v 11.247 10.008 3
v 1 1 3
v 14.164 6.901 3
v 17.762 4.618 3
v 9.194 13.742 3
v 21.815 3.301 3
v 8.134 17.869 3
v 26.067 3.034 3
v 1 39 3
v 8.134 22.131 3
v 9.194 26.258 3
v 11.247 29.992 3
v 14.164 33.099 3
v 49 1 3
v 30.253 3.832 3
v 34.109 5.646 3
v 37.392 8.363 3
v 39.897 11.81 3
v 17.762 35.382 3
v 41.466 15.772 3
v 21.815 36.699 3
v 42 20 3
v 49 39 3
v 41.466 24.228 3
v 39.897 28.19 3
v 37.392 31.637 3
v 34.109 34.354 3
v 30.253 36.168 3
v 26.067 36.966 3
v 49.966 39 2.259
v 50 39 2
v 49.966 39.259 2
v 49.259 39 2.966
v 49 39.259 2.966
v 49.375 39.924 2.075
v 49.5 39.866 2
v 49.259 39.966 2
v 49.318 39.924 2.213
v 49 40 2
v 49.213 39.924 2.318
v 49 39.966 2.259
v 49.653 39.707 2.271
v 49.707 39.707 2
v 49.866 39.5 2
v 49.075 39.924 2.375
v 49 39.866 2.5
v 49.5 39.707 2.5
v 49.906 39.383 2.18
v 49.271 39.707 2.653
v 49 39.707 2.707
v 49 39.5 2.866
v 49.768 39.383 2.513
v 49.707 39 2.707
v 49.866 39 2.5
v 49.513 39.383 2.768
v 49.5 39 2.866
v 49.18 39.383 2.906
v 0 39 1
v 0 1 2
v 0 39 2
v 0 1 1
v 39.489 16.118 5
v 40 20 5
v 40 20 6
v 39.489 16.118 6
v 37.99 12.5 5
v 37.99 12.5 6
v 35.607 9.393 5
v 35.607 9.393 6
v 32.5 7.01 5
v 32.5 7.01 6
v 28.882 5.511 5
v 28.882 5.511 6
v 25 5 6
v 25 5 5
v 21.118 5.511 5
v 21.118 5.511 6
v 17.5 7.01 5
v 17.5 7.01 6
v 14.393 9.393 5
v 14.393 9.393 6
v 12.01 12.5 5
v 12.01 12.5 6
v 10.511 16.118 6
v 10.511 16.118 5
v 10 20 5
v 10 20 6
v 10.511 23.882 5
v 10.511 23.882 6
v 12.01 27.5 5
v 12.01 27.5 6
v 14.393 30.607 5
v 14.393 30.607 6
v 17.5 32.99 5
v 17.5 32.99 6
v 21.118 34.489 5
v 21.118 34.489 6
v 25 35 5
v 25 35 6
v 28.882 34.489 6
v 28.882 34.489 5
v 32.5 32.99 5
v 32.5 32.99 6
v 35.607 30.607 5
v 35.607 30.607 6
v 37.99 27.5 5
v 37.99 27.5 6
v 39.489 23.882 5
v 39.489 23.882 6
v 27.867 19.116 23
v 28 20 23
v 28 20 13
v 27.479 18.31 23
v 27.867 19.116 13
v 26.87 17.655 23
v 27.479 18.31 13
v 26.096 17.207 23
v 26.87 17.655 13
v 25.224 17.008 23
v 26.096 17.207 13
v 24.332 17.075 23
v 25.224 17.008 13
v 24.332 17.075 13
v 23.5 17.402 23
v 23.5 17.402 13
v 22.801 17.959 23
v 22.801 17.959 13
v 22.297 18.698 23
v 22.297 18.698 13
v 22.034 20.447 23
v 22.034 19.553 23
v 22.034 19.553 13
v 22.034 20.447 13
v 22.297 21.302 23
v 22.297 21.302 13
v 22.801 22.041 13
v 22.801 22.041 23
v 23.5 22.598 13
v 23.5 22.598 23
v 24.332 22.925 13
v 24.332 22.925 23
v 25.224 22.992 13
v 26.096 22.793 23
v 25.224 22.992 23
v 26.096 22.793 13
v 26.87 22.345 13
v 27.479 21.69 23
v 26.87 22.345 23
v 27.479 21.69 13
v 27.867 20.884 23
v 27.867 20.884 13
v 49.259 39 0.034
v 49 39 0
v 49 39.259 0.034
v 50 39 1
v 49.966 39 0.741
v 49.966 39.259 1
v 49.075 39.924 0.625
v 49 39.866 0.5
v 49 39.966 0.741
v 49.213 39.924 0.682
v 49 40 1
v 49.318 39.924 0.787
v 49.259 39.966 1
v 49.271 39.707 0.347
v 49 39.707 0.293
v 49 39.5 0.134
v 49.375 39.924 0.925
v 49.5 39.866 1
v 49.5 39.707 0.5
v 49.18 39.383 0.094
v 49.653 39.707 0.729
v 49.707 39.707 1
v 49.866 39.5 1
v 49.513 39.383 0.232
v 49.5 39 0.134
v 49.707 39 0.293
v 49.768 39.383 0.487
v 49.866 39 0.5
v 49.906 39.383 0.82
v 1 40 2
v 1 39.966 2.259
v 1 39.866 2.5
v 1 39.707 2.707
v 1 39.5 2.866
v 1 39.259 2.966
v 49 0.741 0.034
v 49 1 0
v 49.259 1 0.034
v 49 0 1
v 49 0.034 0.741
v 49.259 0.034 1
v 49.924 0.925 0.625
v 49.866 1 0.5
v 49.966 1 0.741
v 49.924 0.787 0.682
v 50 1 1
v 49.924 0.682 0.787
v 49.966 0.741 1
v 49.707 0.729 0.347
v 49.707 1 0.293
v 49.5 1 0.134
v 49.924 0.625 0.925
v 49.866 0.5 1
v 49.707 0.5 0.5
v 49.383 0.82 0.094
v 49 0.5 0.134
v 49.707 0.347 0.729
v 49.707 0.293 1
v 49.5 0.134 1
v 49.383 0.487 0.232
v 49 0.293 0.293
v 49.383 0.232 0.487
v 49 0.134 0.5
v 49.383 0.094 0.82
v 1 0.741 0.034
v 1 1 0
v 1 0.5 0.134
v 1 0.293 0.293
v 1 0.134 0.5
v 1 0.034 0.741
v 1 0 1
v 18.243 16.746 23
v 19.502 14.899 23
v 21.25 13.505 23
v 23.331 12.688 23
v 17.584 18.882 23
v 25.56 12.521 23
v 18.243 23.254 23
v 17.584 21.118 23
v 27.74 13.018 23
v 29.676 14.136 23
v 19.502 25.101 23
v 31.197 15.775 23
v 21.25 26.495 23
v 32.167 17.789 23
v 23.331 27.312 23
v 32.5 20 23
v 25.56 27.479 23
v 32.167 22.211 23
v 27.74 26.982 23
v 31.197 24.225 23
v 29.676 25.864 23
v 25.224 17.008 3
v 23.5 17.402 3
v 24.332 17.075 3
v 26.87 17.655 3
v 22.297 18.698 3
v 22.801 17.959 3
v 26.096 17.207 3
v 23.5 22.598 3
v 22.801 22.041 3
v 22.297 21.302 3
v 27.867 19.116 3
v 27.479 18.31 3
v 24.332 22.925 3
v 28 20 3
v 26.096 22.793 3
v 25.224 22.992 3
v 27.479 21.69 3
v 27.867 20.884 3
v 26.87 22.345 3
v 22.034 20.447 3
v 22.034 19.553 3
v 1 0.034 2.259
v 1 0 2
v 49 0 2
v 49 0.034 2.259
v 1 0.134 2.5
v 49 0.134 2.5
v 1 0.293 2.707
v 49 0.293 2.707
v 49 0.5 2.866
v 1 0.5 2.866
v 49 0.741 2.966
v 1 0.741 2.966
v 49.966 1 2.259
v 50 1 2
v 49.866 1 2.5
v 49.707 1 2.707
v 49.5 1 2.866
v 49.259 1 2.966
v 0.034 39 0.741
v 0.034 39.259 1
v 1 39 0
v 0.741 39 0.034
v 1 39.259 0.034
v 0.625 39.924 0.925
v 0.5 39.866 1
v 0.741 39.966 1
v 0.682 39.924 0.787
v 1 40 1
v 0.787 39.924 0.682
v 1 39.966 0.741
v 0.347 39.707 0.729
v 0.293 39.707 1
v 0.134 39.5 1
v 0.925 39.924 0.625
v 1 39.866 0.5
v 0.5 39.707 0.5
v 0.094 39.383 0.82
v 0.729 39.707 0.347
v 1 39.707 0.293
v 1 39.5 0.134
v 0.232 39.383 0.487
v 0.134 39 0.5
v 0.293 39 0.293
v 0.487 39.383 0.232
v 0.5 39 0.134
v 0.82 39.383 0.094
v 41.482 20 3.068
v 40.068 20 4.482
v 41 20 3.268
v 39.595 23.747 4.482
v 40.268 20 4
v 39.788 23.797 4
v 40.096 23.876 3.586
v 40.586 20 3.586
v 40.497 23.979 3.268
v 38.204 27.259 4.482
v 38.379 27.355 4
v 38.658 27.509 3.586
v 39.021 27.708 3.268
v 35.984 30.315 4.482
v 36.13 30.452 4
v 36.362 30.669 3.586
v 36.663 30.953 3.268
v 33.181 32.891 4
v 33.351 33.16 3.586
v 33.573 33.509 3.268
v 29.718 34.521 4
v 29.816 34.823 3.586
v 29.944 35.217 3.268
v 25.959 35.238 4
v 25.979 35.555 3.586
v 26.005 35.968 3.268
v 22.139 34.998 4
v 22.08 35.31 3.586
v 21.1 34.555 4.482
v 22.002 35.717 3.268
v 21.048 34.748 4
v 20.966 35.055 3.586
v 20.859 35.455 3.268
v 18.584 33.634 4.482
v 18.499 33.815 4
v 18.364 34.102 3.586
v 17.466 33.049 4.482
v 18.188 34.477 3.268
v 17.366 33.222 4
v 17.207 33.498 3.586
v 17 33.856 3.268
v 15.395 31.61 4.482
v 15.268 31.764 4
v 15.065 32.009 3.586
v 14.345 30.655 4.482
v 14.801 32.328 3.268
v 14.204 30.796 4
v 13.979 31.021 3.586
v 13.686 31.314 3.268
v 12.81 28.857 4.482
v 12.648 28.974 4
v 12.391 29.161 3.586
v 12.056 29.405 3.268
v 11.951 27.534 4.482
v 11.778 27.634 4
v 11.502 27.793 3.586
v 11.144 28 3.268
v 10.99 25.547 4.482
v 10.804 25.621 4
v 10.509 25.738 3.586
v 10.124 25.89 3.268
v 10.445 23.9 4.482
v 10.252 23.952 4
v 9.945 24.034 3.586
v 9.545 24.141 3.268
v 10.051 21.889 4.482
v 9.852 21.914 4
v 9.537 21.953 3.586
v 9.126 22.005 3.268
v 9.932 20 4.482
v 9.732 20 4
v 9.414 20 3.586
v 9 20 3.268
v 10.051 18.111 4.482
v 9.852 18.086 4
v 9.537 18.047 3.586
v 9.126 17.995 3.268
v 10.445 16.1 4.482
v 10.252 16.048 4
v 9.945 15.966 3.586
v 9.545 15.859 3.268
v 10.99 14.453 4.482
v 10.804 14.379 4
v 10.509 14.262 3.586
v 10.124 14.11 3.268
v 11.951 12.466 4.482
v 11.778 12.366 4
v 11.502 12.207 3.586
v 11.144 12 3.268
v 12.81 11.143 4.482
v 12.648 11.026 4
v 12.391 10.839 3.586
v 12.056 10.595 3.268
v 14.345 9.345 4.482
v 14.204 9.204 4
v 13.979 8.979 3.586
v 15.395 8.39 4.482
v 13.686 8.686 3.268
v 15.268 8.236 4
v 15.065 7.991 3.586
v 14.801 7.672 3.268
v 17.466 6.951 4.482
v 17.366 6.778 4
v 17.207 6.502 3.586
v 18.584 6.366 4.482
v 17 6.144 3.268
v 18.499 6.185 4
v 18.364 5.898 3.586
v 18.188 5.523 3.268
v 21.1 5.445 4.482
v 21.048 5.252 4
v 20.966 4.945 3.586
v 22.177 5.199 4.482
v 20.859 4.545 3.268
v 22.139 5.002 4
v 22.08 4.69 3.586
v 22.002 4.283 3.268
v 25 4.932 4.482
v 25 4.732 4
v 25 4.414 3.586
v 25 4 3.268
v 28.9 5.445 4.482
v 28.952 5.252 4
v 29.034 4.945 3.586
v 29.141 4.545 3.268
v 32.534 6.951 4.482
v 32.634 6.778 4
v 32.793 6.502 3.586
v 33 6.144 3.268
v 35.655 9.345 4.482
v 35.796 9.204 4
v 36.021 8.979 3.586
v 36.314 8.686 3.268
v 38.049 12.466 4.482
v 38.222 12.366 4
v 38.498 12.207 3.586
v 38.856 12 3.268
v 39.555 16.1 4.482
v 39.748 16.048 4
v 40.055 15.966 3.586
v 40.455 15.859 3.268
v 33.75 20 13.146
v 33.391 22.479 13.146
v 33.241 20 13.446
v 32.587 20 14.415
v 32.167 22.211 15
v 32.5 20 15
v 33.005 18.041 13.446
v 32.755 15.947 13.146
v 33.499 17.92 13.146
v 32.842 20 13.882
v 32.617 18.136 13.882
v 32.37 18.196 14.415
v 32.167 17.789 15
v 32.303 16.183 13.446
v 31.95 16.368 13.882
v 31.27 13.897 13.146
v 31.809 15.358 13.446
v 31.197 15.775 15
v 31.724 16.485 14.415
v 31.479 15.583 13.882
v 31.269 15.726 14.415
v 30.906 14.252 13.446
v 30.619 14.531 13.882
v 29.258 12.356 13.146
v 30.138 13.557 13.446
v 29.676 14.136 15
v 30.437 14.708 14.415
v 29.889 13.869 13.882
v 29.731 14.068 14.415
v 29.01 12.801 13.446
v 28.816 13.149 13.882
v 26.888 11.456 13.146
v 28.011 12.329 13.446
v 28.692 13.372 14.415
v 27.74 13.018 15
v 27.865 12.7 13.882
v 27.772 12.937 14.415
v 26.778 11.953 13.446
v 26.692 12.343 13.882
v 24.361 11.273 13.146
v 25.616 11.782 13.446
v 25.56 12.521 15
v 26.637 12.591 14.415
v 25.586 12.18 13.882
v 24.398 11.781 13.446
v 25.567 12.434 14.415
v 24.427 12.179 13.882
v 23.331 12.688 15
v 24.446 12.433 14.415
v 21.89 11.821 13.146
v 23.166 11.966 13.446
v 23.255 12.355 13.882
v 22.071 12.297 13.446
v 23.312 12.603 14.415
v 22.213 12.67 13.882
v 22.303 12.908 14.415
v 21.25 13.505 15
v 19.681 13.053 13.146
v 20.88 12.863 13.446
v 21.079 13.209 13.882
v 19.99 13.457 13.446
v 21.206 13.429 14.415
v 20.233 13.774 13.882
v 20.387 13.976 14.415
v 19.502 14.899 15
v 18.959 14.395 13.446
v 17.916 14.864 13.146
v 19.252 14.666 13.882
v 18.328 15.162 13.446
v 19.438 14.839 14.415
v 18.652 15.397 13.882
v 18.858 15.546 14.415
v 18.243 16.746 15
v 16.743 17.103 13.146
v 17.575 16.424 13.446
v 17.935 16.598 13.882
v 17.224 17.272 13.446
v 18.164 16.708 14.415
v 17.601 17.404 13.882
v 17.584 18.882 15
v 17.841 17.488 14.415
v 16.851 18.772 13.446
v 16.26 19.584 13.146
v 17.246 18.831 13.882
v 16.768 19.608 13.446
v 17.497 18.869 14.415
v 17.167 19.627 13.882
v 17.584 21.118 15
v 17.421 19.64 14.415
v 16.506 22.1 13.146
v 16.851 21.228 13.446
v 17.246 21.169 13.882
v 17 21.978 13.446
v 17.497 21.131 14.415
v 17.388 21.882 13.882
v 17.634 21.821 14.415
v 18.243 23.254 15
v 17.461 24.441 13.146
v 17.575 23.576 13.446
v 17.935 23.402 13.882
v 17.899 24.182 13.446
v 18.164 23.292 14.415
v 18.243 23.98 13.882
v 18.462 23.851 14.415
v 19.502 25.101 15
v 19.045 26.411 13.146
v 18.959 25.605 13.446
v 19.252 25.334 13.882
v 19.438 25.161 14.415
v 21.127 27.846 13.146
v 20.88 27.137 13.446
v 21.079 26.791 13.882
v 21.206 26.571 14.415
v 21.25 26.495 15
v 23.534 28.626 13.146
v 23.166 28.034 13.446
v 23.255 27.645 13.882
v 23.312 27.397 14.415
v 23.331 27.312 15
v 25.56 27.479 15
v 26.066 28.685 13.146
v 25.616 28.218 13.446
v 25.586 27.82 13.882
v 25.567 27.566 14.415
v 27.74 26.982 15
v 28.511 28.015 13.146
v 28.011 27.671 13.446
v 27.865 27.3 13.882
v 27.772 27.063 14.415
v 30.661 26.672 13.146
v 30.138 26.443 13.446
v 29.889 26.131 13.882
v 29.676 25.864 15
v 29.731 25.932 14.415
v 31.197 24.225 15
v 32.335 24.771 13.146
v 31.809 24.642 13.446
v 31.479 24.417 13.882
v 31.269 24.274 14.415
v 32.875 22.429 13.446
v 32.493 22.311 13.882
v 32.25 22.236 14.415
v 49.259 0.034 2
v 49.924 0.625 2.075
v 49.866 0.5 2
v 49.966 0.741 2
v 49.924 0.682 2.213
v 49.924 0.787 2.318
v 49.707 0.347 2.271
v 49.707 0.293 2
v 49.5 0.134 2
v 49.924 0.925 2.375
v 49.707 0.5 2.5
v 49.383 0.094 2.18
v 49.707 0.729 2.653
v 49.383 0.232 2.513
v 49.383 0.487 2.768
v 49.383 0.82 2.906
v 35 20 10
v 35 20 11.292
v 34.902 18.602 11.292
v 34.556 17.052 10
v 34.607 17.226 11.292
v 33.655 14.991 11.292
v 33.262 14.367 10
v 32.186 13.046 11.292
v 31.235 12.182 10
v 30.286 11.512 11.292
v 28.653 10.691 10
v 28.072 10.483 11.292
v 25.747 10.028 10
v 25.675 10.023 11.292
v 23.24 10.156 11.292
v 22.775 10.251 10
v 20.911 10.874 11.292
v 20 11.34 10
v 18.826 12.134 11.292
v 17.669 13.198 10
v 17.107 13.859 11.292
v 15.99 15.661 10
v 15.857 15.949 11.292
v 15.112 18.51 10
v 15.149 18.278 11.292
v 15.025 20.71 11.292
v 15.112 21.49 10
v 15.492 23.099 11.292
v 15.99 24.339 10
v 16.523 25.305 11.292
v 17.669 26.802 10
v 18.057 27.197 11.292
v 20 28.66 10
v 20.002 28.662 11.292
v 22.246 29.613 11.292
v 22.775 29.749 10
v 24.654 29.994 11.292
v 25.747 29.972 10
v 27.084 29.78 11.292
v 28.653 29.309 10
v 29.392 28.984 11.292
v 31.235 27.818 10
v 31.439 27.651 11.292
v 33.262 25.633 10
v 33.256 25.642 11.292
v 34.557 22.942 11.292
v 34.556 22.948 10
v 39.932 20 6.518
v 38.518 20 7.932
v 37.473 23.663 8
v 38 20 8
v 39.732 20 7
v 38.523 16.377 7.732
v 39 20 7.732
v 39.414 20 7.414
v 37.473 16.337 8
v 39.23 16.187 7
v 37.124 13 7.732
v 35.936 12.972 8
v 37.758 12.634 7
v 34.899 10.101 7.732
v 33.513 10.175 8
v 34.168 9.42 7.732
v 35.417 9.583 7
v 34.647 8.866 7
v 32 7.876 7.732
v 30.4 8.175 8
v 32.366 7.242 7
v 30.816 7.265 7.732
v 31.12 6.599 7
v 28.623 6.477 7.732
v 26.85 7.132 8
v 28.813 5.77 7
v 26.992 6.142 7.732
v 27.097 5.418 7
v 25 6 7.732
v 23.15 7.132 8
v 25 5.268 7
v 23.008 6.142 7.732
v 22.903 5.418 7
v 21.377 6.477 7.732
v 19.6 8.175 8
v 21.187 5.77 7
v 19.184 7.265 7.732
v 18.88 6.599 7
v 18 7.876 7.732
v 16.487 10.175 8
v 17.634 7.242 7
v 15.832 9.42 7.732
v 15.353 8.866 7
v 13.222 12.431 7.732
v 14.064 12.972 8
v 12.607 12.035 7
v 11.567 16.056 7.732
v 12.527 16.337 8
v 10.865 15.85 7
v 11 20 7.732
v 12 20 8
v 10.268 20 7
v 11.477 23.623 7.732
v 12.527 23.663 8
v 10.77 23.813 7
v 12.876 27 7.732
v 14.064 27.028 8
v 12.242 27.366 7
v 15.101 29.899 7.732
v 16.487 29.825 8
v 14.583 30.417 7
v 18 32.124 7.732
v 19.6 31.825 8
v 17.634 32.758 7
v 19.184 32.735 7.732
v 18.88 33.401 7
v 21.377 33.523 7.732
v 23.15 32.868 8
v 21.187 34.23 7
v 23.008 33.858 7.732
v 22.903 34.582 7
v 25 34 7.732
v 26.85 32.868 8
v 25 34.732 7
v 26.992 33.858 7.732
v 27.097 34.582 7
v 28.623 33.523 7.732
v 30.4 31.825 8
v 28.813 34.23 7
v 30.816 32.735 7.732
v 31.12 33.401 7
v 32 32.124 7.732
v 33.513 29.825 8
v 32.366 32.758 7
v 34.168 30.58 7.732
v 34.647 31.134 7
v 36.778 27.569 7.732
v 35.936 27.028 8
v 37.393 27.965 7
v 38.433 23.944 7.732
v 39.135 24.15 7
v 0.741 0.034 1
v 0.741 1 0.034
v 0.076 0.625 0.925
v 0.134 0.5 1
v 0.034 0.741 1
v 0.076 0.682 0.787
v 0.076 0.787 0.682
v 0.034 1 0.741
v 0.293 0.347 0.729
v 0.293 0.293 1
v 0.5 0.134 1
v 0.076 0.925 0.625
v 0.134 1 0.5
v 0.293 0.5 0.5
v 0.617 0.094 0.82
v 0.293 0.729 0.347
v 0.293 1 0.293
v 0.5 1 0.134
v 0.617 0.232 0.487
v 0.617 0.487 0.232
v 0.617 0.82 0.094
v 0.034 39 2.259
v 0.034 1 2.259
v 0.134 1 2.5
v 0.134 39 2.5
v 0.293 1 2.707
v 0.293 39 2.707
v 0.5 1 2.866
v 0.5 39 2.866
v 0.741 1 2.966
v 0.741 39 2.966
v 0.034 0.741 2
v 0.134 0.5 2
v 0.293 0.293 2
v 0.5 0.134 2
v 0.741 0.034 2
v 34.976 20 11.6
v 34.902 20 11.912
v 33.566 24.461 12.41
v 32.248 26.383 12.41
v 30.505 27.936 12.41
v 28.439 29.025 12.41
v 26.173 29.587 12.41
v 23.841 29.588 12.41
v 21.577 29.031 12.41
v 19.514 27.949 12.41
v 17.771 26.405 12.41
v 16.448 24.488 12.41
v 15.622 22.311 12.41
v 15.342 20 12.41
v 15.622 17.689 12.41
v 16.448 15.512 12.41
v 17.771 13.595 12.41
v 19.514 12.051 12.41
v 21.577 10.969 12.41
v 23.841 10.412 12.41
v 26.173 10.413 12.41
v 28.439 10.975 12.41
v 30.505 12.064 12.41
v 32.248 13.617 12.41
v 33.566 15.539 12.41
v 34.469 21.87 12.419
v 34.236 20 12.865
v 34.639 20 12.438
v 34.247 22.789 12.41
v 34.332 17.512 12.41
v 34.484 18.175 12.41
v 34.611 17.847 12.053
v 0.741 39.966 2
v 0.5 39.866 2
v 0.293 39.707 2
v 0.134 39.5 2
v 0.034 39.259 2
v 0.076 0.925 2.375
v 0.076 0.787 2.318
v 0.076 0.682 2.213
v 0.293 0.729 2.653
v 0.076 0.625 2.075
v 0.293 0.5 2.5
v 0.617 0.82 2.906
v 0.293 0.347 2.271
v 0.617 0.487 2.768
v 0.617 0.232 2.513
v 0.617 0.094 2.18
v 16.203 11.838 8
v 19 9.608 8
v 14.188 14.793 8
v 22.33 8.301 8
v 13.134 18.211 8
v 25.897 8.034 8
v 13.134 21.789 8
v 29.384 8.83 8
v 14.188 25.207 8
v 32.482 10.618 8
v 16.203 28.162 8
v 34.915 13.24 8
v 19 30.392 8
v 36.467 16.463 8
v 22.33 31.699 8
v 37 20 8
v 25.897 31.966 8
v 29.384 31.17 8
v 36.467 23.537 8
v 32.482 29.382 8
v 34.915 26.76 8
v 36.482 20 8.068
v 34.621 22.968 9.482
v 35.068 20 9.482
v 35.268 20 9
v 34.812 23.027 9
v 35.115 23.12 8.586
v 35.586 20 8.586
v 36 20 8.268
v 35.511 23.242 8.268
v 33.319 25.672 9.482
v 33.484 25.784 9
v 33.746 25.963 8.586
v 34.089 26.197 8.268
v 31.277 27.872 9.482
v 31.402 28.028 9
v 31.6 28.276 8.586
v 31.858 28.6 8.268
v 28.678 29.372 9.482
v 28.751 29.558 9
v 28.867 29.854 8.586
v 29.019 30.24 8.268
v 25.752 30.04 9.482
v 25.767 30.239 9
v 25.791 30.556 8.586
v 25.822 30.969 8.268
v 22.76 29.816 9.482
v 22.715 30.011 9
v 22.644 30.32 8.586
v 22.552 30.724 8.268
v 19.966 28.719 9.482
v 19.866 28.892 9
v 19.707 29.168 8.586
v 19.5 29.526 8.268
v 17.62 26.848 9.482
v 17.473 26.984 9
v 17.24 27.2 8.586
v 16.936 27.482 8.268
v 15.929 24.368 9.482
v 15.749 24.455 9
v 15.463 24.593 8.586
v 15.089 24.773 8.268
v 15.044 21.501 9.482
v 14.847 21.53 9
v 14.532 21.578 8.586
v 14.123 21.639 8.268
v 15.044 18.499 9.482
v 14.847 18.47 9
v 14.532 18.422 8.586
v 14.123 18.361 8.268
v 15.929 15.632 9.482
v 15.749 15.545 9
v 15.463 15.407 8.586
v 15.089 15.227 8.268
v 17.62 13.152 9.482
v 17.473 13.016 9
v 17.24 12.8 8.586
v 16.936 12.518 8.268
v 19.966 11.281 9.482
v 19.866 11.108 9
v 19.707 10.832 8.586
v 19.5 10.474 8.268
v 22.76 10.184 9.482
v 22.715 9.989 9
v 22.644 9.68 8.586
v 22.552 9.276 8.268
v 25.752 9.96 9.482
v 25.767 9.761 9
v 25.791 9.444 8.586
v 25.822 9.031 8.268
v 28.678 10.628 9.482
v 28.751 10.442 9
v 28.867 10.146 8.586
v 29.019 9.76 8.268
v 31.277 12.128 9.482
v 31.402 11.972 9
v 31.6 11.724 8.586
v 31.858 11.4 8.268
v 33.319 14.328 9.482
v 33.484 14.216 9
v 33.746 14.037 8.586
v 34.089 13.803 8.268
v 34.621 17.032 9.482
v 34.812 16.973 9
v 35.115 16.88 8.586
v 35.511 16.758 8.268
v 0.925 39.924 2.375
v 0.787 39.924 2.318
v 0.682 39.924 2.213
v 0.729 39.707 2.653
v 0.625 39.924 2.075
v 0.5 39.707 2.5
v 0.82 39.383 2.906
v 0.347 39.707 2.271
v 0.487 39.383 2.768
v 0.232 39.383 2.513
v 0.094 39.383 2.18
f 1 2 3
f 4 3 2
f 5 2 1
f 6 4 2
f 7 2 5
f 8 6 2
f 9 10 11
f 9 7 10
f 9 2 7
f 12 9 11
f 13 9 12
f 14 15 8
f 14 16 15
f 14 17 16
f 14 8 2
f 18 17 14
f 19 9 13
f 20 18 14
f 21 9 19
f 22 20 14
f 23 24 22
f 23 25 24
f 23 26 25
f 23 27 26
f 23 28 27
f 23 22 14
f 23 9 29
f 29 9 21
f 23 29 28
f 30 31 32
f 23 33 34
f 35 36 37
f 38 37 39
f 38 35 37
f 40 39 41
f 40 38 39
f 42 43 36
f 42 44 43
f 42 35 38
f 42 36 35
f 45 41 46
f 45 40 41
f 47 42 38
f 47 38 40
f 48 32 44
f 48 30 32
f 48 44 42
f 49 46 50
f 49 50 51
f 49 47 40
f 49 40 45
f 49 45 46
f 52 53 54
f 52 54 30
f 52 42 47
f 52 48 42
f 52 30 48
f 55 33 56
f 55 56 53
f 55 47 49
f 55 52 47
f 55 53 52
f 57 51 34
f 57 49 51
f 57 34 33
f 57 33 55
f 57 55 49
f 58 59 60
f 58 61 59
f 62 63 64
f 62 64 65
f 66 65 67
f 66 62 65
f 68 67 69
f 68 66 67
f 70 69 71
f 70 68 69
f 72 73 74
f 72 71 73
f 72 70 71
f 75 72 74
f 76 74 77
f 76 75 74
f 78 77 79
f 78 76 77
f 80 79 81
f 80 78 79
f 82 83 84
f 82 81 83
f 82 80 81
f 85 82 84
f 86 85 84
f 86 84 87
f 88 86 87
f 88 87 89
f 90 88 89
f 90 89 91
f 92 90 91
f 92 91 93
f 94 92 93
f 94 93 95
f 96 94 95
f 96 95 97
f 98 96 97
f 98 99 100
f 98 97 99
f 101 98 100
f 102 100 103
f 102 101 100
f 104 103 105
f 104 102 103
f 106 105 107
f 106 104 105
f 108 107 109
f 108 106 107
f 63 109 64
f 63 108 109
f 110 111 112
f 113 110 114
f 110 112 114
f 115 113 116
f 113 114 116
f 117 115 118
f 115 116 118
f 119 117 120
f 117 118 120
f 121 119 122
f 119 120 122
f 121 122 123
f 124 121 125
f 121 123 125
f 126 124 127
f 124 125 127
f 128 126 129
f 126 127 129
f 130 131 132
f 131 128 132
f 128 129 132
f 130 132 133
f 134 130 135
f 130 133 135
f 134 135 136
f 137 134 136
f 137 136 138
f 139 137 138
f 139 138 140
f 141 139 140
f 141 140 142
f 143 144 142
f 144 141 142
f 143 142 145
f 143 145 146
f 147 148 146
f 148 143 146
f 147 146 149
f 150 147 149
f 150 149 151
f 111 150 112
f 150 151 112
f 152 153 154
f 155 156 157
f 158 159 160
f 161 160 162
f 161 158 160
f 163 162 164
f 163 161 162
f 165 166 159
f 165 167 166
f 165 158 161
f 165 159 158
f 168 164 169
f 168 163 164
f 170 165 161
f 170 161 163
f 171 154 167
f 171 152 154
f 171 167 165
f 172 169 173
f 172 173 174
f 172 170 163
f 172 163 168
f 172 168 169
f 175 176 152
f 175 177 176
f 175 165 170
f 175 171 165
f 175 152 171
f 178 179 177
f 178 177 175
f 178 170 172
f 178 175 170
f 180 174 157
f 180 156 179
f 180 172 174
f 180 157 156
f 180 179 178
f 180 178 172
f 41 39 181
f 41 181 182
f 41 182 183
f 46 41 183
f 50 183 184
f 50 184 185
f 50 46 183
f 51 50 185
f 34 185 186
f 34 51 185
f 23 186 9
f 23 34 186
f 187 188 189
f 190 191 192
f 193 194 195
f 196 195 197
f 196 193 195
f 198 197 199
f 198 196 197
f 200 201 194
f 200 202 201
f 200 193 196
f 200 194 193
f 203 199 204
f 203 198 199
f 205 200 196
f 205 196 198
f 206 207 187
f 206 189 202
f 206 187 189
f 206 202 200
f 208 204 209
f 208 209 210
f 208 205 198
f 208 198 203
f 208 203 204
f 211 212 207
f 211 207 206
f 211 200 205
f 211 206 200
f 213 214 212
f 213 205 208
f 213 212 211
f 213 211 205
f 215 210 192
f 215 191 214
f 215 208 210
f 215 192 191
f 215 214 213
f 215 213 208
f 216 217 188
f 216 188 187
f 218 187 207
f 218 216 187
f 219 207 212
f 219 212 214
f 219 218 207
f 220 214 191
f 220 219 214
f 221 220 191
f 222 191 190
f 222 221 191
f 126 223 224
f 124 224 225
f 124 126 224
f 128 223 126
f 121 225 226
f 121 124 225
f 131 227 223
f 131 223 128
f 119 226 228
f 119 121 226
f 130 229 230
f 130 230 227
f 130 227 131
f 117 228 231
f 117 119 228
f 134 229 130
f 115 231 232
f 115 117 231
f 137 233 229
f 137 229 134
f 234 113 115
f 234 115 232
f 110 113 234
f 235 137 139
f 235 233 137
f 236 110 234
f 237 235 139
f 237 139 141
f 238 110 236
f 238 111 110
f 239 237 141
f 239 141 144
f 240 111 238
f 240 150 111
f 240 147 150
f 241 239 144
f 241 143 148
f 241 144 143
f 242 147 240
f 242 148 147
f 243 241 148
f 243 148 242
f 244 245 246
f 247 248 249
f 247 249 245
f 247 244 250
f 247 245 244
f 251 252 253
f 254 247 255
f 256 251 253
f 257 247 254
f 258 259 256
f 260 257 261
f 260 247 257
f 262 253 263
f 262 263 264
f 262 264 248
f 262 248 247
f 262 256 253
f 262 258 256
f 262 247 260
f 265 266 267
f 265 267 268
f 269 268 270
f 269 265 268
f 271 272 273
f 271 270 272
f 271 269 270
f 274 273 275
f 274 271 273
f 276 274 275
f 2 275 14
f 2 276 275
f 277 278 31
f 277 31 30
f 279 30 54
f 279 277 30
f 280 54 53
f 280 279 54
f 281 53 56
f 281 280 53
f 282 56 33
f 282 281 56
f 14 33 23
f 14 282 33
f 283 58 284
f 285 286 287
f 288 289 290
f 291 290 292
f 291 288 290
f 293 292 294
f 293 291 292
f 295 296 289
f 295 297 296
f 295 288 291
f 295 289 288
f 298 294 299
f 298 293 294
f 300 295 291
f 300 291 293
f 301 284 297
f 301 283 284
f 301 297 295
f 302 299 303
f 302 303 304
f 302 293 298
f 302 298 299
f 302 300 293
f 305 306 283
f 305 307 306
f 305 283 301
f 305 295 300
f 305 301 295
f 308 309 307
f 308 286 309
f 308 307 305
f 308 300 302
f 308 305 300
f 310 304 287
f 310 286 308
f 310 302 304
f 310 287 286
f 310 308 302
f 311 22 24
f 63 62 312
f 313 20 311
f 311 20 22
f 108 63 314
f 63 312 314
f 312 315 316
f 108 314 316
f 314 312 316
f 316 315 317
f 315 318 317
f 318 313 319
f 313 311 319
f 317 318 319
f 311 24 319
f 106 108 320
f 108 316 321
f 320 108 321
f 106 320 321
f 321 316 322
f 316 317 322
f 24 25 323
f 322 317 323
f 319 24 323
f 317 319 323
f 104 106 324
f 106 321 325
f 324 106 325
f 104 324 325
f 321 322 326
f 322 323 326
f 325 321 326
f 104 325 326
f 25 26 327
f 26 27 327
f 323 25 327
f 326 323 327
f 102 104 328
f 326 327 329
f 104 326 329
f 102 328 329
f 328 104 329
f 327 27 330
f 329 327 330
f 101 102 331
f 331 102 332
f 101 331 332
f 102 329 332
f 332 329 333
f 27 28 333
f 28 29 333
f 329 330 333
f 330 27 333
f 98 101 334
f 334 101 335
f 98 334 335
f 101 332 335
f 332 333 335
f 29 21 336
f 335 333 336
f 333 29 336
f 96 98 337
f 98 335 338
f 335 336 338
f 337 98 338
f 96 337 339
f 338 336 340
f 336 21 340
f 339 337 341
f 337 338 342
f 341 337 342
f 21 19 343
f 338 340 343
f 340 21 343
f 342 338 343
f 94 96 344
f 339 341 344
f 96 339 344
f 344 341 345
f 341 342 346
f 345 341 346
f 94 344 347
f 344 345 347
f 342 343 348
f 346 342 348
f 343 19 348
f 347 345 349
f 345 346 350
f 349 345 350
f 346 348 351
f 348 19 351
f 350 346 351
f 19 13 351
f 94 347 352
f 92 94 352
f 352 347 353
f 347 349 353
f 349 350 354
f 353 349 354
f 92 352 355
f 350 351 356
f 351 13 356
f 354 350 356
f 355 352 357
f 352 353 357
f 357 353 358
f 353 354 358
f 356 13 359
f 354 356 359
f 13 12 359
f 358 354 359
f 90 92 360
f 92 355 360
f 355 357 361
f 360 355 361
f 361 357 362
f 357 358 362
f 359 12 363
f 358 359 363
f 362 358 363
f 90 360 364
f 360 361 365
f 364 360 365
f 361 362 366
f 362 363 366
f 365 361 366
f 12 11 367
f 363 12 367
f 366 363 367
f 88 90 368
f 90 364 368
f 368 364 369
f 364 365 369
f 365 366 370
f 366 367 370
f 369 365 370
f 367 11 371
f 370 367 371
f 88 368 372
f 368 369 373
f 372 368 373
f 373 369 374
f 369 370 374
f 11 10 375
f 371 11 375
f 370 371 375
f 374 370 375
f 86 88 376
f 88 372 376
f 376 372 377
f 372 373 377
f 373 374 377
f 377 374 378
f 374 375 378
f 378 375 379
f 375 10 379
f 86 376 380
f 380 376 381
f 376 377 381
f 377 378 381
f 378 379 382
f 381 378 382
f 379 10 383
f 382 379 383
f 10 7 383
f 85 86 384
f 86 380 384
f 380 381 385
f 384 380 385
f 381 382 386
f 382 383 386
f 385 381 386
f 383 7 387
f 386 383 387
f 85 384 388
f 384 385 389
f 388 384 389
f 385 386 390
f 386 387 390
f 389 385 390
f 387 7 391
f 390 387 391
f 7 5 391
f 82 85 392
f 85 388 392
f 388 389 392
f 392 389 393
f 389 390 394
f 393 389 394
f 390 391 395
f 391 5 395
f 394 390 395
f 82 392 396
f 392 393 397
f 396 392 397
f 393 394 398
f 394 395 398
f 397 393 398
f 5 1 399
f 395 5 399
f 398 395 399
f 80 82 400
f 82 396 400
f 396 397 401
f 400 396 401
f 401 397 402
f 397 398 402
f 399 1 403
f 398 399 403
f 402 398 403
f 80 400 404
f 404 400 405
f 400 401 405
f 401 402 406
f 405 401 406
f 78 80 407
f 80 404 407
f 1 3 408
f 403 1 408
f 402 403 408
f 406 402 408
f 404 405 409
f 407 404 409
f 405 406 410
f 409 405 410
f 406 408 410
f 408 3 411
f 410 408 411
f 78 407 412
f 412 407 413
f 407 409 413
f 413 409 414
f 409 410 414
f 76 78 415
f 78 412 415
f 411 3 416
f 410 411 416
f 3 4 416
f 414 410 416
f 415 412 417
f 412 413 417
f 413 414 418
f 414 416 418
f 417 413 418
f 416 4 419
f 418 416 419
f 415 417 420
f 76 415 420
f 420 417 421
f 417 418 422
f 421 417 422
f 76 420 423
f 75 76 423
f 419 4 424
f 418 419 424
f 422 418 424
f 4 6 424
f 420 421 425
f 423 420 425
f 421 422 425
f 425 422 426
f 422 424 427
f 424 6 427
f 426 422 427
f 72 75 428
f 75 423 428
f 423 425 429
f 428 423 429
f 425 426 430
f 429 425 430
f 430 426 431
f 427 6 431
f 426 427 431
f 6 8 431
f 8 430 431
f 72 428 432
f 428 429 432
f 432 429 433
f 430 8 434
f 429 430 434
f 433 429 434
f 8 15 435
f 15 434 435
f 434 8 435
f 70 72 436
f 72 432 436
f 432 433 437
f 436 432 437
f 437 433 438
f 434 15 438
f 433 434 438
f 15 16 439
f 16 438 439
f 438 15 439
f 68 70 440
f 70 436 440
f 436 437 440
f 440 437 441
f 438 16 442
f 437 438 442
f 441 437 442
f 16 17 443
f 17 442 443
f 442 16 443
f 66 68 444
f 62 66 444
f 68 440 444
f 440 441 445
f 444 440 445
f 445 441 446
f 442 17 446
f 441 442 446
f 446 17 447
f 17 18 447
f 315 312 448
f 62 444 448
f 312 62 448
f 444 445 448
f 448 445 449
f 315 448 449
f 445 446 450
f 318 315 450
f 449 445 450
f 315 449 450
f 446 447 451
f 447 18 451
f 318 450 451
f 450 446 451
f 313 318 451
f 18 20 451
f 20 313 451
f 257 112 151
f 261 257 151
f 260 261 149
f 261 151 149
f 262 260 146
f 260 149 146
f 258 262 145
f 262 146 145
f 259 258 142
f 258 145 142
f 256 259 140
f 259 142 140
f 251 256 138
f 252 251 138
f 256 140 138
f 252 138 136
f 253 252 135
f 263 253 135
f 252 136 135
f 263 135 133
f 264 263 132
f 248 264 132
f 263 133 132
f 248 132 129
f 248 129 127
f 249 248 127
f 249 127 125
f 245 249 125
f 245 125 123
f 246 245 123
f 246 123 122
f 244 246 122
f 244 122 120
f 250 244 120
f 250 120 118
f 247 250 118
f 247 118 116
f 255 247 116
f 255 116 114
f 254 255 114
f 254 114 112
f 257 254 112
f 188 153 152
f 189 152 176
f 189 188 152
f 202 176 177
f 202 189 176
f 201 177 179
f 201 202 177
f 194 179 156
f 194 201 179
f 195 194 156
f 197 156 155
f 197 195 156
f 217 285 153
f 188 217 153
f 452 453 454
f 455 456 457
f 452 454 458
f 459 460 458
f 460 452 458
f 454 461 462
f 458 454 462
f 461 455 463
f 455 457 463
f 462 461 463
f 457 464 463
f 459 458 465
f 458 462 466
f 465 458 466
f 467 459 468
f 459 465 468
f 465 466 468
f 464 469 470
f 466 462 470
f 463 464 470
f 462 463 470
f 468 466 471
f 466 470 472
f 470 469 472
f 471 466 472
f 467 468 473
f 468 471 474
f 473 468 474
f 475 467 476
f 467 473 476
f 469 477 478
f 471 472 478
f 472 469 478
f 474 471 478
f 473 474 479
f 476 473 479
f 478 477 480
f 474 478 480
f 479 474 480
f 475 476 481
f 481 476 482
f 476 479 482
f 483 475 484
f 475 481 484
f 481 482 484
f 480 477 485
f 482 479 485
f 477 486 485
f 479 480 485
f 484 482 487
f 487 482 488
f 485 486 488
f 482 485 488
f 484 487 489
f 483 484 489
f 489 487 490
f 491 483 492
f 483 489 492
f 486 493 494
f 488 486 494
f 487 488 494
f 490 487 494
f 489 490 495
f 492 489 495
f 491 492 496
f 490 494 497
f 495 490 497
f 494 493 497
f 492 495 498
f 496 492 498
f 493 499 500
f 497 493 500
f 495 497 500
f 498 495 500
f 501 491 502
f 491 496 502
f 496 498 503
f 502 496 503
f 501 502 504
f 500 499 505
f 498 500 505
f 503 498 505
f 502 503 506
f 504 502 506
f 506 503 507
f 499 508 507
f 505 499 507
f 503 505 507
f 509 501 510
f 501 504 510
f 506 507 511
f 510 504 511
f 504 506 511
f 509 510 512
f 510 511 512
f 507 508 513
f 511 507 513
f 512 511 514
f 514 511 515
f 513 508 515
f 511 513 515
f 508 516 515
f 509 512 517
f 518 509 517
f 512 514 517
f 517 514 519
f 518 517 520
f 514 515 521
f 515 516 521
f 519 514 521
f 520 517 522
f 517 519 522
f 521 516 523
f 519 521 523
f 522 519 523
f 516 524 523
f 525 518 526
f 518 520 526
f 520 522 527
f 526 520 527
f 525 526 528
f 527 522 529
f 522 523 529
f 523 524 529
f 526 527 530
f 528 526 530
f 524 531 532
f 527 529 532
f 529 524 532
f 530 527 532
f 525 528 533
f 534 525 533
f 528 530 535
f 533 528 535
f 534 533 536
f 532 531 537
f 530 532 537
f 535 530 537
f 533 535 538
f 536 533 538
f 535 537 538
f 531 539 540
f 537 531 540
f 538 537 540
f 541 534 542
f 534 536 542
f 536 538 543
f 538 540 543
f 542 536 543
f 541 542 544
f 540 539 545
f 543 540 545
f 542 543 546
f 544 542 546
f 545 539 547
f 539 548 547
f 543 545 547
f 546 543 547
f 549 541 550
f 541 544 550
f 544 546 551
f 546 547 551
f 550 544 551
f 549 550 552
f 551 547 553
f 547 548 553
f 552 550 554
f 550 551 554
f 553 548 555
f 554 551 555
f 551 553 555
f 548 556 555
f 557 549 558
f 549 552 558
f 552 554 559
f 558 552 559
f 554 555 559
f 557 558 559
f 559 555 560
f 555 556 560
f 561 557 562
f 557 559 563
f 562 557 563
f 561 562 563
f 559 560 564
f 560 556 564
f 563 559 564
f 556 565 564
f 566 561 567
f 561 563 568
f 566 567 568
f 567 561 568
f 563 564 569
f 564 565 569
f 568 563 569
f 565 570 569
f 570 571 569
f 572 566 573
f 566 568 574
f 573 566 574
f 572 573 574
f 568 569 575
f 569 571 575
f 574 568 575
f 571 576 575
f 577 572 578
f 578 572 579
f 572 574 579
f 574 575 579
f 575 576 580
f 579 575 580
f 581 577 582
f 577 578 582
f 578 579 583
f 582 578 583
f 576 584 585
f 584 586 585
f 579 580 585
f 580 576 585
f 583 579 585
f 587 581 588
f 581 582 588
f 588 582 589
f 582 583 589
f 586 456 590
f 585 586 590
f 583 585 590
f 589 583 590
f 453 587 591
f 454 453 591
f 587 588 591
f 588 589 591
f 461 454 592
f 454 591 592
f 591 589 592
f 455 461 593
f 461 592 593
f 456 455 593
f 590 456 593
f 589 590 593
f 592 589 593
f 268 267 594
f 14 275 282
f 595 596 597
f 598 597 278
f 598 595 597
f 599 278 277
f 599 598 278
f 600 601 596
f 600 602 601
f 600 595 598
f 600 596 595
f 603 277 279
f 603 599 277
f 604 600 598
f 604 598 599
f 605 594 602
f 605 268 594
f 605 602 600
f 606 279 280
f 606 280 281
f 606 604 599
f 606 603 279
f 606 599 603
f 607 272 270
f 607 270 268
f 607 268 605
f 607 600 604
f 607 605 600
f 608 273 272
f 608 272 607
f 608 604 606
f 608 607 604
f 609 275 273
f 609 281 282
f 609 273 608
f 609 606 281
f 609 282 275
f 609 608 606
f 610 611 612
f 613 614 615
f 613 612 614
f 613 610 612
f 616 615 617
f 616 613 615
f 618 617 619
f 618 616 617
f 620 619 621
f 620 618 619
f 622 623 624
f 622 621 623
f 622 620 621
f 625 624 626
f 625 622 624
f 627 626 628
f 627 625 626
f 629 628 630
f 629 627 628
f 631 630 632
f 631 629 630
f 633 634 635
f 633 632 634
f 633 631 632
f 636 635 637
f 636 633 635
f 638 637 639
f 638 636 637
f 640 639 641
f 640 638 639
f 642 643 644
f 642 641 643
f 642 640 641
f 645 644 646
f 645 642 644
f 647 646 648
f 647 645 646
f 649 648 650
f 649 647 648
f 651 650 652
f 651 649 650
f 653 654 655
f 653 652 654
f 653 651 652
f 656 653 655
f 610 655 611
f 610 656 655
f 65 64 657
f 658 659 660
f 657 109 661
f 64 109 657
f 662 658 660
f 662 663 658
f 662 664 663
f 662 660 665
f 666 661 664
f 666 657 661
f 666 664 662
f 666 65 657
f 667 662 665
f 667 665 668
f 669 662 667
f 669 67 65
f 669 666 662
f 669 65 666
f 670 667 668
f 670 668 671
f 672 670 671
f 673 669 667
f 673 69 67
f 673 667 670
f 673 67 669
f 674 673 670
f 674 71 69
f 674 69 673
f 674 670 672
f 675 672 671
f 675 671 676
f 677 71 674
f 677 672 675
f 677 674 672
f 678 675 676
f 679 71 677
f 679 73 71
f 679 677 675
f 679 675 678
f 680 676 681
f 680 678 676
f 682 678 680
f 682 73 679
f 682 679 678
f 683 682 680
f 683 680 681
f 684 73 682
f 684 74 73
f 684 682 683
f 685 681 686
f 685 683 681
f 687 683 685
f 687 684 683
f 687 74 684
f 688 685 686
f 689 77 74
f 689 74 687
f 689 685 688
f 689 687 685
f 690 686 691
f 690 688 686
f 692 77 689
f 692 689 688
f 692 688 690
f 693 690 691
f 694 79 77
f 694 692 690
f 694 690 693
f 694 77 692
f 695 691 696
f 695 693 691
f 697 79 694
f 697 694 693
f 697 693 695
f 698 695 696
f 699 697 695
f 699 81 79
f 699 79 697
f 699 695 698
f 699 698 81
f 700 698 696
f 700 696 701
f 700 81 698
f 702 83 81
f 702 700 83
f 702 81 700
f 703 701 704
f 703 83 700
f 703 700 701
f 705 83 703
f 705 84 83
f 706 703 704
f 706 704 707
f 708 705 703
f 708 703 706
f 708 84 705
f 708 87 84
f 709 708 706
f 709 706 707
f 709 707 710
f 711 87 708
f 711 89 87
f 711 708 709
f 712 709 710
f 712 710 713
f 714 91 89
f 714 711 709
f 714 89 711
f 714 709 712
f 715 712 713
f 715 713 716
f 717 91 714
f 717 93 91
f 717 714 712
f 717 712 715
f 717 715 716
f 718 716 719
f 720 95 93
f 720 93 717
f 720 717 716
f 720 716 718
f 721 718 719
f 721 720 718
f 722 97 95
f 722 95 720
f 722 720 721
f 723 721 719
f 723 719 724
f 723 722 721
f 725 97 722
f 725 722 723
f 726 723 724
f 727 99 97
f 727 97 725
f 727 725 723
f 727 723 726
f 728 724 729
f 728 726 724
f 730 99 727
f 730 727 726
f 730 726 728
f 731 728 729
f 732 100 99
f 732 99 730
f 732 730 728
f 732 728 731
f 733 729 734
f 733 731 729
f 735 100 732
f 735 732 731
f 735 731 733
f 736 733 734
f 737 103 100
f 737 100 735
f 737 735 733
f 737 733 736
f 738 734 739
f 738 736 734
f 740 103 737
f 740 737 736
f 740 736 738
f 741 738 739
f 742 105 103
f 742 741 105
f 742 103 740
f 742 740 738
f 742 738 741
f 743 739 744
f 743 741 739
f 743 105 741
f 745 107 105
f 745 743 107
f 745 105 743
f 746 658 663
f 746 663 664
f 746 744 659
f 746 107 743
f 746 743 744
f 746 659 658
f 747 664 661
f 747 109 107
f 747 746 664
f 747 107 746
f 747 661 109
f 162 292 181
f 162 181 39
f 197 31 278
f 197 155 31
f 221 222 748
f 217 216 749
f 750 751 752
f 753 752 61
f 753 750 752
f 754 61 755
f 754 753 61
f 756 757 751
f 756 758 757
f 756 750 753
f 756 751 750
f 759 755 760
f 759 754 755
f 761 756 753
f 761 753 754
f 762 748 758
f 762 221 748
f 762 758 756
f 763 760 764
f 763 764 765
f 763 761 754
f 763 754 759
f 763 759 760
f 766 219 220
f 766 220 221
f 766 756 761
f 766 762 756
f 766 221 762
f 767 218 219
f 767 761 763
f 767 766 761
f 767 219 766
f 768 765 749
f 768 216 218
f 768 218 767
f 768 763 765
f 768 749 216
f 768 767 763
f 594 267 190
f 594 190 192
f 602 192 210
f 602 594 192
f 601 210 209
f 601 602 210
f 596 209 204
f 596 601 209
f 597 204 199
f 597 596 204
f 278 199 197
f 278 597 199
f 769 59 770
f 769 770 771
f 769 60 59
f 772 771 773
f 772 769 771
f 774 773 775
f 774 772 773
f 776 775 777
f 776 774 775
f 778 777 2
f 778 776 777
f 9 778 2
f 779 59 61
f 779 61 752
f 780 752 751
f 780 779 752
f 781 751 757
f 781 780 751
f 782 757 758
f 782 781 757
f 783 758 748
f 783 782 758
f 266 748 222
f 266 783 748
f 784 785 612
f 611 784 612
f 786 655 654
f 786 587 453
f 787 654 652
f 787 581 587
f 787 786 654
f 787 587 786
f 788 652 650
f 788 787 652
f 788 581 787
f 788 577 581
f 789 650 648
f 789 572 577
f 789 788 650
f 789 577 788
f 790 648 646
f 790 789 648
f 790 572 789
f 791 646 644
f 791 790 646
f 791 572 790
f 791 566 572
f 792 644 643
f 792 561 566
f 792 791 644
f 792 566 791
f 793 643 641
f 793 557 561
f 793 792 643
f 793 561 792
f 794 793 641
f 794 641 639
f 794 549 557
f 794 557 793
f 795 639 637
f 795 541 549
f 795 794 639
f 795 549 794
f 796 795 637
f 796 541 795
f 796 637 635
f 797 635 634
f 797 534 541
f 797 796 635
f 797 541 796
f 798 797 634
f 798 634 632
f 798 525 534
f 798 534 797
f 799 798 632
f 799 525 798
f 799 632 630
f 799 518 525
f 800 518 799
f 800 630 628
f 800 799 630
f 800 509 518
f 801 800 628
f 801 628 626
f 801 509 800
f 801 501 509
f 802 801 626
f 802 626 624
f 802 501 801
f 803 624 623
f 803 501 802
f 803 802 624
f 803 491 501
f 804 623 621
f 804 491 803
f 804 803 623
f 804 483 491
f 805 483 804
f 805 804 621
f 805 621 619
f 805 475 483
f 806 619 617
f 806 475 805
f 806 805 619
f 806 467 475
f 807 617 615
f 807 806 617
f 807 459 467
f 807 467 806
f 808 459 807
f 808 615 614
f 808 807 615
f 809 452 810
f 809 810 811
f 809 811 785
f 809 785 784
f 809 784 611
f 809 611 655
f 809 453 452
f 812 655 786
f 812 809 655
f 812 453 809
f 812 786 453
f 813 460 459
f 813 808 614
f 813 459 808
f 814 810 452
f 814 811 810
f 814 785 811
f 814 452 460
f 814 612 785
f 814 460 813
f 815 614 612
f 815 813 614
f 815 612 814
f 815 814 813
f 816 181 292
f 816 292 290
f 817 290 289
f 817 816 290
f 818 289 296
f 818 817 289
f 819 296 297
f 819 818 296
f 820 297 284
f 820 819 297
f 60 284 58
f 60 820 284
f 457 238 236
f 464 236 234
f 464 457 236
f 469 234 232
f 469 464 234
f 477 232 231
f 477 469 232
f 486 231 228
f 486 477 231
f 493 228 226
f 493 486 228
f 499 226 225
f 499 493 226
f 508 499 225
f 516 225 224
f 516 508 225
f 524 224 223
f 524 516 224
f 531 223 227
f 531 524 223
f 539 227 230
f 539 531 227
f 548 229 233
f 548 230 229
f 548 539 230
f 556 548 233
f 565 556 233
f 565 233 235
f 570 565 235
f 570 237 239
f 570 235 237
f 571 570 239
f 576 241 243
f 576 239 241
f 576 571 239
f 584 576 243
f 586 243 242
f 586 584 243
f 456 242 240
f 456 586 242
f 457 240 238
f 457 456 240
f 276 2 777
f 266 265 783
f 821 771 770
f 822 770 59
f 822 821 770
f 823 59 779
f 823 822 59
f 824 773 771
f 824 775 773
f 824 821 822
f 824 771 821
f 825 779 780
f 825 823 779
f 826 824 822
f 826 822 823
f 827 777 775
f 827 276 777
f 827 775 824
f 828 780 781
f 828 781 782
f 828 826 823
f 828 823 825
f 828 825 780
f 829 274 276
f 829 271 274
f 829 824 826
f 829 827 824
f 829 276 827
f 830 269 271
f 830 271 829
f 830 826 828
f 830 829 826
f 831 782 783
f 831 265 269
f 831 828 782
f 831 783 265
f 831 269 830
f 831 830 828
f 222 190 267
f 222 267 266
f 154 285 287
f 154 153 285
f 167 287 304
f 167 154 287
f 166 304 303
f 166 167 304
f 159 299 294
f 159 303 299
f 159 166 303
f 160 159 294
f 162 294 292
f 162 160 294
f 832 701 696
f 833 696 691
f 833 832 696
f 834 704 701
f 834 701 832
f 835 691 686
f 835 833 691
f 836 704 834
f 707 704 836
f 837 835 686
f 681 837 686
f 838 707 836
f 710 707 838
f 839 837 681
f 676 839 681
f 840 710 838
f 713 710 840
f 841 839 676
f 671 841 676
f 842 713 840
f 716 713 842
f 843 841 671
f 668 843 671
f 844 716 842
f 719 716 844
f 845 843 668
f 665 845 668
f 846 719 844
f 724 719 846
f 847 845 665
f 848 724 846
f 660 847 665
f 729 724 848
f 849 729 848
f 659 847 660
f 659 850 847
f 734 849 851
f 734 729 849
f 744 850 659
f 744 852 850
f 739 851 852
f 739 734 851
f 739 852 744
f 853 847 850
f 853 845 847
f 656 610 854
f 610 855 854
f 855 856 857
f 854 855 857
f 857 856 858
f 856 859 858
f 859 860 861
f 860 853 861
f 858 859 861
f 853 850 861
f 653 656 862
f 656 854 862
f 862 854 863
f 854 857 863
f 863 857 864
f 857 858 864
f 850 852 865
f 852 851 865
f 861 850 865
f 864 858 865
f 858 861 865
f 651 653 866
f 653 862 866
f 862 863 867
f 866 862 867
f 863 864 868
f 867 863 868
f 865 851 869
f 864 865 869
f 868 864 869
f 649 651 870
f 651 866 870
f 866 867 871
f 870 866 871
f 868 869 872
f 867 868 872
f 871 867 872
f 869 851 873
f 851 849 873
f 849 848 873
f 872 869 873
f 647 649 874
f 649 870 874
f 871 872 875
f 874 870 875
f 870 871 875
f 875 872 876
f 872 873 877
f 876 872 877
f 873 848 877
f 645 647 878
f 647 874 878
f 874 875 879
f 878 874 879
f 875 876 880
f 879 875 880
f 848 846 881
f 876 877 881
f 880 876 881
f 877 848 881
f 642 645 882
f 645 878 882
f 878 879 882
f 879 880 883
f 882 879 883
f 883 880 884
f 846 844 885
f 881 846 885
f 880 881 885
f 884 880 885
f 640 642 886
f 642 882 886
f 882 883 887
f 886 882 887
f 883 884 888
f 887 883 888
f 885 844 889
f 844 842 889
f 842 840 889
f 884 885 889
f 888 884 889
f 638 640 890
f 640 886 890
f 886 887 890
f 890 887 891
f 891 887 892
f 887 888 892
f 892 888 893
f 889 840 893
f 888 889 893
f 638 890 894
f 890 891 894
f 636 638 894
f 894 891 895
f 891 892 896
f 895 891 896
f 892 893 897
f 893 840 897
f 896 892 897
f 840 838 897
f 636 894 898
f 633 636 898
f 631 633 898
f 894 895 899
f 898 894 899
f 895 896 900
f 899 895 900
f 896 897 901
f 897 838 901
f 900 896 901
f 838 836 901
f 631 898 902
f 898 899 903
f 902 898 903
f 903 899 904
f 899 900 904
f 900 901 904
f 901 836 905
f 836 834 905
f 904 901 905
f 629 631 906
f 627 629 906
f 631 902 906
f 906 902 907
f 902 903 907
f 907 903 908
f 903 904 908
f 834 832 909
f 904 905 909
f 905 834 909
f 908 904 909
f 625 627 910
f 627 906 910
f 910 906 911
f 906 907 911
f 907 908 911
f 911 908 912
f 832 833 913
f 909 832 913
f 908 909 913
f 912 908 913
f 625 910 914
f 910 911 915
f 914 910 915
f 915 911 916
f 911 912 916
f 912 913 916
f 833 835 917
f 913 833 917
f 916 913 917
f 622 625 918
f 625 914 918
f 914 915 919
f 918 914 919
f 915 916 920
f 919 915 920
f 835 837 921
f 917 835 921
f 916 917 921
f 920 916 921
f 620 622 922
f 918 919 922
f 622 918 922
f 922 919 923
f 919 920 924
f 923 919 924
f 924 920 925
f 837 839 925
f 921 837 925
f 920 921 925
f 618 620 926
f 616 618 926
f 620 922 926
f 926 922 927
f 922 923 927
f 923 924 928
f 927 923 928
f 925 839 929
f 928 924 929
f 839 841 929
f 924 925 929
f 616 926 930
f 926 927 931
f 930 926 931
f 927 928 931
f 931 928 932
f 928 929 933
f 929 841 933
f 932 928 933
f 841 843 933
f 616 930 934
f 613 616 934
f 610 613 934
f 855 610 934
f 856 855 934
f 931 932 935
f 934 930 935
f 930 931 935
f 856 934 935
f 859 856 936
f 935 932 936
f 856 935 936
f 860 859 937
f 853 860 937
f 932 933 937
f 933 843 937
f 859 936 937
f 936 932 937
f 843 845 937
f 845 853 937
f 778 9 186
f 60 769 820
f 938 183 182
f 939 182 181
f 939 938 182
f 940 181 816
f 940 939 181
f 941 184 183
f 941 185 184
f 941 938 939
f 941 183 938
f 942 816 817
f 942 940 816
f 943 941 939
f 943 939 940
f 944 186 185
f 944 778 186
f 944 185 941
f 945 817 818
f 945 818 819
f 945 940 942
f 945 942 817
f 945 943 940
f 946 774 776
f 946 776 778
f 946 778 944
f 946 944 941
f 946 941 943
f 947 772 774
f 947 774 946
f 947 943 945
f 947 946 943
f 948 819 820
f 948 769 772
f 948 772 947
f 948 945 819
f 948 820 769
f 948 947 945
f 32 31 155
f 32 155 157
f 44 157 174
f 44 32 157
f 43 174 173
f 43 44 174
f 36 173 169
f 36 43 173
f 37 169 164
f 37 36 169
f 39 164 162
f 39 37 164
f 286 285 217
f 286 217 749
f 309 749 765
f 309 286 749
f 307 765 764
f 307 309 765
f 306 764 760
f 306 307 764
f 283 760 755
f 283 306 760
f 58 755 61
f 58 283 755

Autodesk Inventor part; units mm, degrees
ref_plane "YZ Plane" through (0, 0, 0) normal (1, 0, 0) x (0, 1, 0)
ref_plane "XZ Plane" through (0, 0, 0) normal (0, 1, 0) x (-1, 0, 0)
ref_plane "XY Plane" through (0, 0, 0) normal (0, 0, 1) x (1, 0, 0)
sketch "Boceto1" plane through (0, 0, 0) normal (0, 0, 1) x (1, 0, 0)
  line L0 (0, 0) -> (0, 40)
  line L1 (0, 40) -> (50, 40)
  line L2 (50, 40) -> (50, 0)
  line L3 (50, 0) -> (0, 0)
  dimension "d0" = 40
  dimension "d1" = 50
extrude "Extrusión1" add sketch "Boceto1" along normal blind 3
sketch "Boceto2" plane through (0, 0, 3) normal (0, 0, 1) x (1, 0, 0)
  line L0 (50, 40) -> (0, 40) projected
  line L1 (0, 0) -> (50, 0) projected
  circle A0 centre (25, 20) radius 15
  dimension "d4" = 30
extrude "Extrusión2" add sketch "Boceto2" along normal blind 5
sketch "Boceto3" plane through (25, 20, 8) normal (0, 0, 1) x (1, 0, 0)
  circle A0 centre (0, 0) radius 3
  circle A1 centre (0, 0) radius 7.5
  point P0 (-25, -20)
  dimension "d8" = 6
  dimension "d9" = 15
extrude "Extrusión3" add sketch "Boceto3" along normal blind 15
sketch "Boceto4" plane through (25, 20, 8) normal (0, 0, 1) x (1, 0, 0)
  circle A0 centre (0, 0) radius 10
  point P0 (-25, -20)
  dimension "d12" = 20
extrude "Extrusión4" add sketch "Boceto4" along normal blind 5
fillet "Empalme1" radius 2 5 edges at (17.5, 20, 13) (15, 20, 13) (15, 20, 8) (10, 20, 8) (10, 20, 3)
fillet "Empalme2" radius 1 12 edges at (25, 0, 3) (50, 20, 3) (25, 0, 0) (50, 20, 0) (50, 0, 1.5) (0, 20, 3) (0, 20, 0) (0, 40, 1.5) (25, 40, 0) (25, 40, 3) (0, 0, 1.5) (50, 40, 1.5)
sketch "Boceto5" plane through (25, 20, 23) normal (0, 0, 1) x (1, 0, 0)
  circle A0 centre (0, 0) radius 3
  point P0 (-25, -20)
extrude "Extrusión5" cut sketch "Boceto5" against normal blind 20
properties part number "antena_up"
